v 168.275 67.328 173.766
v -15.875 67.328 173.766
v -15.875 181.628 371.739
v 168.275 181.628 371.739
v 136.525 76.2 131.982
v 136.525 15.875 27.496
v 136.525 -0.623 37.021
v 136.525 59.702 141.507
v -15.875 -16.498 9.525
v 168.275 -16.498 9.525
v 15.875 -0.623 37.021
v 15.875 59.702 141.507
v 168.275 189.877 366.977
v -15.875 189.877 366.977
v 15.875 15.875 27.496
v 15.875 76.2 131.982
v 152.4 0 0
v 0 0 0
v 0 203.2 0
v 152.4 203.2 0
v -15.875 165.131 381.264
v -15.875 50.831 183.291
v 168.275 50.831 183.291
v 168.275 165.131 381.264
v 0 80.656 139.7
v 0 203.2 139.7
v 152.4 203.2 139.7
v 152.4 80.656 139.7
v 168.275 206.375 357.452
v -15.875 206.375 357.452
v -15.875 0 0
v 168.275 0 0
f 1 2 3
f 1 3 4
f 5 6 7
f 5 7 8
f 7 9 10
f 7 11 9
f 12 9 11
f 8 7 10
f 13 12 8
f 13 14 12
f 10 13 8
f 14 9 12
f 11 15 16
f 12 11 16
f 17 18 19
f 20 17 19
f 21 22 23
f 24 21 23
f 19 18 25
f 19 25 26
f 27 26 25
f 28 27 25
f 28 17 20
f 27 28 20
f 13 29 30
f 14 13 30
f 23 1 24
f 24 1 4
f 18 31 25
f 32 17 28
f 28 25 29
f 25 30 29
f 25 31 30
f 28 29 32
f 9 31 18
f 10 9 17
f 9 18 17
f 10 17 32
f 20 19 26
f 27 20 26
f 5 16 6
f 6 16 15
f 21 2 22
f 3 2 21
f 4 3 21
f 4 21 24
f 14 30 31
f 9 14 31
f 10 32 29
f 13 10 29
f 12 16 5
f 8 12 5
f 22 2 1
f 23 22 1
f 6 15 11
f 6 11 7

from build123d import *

# Parameters (mm, degrees)
F1_DEPTH = 152.4
F2_W     = 120.65
F2_H     = 120.65
F3_DEPTH = 19.05
F5_W     = 184.15
F5_H     = 228.6
F6_DEPTH = 19.05


with BuildPart() as f1:
    # F0 (on Right) → F1 (new body)
    with BuildSketch(Plane.YZ):
        Polygon((80.6558326058, 139.7), (0, 0), (203.2, 0), (203.2, 139.7), align=None)
    extrude(amount=F1_DEPTH)

    # F2 (on face) → F3 (join)
    with BuildSketch(Plane(origin=(0, 0, 0), x_dir=(1, 0, 0), z_dir=(0, -0.8660254038, 0.5))):
        Polygon((-15.875, 0), (76.2, 0), (168.275, 0), (168.275, 412.75), (76.2, 412.75), (-15.875, 412.75), align=None)
        with Locations((76.2, 92.075)):
            Rectangle(F2_W, F2_H, mode=Mode.SUBTRACT)
    extrude(amount=F3_DEPTH)


with BuildPart() as f6:
    # F5 (on offset) → F6 (new body)
    with BuildSketch(Plane(origin=(0, -24.7466759131, 14.2875), x_dir=(1, 0, 0), z_dir=(0, -0.8660254038, 0.5))):
        with Locations((76.2, 298.45)):
            Rectangle(F5_W, F5_H)
    extrude(amount=F6_DEPTH)


solid = Compound([f1.part, f6.part])
